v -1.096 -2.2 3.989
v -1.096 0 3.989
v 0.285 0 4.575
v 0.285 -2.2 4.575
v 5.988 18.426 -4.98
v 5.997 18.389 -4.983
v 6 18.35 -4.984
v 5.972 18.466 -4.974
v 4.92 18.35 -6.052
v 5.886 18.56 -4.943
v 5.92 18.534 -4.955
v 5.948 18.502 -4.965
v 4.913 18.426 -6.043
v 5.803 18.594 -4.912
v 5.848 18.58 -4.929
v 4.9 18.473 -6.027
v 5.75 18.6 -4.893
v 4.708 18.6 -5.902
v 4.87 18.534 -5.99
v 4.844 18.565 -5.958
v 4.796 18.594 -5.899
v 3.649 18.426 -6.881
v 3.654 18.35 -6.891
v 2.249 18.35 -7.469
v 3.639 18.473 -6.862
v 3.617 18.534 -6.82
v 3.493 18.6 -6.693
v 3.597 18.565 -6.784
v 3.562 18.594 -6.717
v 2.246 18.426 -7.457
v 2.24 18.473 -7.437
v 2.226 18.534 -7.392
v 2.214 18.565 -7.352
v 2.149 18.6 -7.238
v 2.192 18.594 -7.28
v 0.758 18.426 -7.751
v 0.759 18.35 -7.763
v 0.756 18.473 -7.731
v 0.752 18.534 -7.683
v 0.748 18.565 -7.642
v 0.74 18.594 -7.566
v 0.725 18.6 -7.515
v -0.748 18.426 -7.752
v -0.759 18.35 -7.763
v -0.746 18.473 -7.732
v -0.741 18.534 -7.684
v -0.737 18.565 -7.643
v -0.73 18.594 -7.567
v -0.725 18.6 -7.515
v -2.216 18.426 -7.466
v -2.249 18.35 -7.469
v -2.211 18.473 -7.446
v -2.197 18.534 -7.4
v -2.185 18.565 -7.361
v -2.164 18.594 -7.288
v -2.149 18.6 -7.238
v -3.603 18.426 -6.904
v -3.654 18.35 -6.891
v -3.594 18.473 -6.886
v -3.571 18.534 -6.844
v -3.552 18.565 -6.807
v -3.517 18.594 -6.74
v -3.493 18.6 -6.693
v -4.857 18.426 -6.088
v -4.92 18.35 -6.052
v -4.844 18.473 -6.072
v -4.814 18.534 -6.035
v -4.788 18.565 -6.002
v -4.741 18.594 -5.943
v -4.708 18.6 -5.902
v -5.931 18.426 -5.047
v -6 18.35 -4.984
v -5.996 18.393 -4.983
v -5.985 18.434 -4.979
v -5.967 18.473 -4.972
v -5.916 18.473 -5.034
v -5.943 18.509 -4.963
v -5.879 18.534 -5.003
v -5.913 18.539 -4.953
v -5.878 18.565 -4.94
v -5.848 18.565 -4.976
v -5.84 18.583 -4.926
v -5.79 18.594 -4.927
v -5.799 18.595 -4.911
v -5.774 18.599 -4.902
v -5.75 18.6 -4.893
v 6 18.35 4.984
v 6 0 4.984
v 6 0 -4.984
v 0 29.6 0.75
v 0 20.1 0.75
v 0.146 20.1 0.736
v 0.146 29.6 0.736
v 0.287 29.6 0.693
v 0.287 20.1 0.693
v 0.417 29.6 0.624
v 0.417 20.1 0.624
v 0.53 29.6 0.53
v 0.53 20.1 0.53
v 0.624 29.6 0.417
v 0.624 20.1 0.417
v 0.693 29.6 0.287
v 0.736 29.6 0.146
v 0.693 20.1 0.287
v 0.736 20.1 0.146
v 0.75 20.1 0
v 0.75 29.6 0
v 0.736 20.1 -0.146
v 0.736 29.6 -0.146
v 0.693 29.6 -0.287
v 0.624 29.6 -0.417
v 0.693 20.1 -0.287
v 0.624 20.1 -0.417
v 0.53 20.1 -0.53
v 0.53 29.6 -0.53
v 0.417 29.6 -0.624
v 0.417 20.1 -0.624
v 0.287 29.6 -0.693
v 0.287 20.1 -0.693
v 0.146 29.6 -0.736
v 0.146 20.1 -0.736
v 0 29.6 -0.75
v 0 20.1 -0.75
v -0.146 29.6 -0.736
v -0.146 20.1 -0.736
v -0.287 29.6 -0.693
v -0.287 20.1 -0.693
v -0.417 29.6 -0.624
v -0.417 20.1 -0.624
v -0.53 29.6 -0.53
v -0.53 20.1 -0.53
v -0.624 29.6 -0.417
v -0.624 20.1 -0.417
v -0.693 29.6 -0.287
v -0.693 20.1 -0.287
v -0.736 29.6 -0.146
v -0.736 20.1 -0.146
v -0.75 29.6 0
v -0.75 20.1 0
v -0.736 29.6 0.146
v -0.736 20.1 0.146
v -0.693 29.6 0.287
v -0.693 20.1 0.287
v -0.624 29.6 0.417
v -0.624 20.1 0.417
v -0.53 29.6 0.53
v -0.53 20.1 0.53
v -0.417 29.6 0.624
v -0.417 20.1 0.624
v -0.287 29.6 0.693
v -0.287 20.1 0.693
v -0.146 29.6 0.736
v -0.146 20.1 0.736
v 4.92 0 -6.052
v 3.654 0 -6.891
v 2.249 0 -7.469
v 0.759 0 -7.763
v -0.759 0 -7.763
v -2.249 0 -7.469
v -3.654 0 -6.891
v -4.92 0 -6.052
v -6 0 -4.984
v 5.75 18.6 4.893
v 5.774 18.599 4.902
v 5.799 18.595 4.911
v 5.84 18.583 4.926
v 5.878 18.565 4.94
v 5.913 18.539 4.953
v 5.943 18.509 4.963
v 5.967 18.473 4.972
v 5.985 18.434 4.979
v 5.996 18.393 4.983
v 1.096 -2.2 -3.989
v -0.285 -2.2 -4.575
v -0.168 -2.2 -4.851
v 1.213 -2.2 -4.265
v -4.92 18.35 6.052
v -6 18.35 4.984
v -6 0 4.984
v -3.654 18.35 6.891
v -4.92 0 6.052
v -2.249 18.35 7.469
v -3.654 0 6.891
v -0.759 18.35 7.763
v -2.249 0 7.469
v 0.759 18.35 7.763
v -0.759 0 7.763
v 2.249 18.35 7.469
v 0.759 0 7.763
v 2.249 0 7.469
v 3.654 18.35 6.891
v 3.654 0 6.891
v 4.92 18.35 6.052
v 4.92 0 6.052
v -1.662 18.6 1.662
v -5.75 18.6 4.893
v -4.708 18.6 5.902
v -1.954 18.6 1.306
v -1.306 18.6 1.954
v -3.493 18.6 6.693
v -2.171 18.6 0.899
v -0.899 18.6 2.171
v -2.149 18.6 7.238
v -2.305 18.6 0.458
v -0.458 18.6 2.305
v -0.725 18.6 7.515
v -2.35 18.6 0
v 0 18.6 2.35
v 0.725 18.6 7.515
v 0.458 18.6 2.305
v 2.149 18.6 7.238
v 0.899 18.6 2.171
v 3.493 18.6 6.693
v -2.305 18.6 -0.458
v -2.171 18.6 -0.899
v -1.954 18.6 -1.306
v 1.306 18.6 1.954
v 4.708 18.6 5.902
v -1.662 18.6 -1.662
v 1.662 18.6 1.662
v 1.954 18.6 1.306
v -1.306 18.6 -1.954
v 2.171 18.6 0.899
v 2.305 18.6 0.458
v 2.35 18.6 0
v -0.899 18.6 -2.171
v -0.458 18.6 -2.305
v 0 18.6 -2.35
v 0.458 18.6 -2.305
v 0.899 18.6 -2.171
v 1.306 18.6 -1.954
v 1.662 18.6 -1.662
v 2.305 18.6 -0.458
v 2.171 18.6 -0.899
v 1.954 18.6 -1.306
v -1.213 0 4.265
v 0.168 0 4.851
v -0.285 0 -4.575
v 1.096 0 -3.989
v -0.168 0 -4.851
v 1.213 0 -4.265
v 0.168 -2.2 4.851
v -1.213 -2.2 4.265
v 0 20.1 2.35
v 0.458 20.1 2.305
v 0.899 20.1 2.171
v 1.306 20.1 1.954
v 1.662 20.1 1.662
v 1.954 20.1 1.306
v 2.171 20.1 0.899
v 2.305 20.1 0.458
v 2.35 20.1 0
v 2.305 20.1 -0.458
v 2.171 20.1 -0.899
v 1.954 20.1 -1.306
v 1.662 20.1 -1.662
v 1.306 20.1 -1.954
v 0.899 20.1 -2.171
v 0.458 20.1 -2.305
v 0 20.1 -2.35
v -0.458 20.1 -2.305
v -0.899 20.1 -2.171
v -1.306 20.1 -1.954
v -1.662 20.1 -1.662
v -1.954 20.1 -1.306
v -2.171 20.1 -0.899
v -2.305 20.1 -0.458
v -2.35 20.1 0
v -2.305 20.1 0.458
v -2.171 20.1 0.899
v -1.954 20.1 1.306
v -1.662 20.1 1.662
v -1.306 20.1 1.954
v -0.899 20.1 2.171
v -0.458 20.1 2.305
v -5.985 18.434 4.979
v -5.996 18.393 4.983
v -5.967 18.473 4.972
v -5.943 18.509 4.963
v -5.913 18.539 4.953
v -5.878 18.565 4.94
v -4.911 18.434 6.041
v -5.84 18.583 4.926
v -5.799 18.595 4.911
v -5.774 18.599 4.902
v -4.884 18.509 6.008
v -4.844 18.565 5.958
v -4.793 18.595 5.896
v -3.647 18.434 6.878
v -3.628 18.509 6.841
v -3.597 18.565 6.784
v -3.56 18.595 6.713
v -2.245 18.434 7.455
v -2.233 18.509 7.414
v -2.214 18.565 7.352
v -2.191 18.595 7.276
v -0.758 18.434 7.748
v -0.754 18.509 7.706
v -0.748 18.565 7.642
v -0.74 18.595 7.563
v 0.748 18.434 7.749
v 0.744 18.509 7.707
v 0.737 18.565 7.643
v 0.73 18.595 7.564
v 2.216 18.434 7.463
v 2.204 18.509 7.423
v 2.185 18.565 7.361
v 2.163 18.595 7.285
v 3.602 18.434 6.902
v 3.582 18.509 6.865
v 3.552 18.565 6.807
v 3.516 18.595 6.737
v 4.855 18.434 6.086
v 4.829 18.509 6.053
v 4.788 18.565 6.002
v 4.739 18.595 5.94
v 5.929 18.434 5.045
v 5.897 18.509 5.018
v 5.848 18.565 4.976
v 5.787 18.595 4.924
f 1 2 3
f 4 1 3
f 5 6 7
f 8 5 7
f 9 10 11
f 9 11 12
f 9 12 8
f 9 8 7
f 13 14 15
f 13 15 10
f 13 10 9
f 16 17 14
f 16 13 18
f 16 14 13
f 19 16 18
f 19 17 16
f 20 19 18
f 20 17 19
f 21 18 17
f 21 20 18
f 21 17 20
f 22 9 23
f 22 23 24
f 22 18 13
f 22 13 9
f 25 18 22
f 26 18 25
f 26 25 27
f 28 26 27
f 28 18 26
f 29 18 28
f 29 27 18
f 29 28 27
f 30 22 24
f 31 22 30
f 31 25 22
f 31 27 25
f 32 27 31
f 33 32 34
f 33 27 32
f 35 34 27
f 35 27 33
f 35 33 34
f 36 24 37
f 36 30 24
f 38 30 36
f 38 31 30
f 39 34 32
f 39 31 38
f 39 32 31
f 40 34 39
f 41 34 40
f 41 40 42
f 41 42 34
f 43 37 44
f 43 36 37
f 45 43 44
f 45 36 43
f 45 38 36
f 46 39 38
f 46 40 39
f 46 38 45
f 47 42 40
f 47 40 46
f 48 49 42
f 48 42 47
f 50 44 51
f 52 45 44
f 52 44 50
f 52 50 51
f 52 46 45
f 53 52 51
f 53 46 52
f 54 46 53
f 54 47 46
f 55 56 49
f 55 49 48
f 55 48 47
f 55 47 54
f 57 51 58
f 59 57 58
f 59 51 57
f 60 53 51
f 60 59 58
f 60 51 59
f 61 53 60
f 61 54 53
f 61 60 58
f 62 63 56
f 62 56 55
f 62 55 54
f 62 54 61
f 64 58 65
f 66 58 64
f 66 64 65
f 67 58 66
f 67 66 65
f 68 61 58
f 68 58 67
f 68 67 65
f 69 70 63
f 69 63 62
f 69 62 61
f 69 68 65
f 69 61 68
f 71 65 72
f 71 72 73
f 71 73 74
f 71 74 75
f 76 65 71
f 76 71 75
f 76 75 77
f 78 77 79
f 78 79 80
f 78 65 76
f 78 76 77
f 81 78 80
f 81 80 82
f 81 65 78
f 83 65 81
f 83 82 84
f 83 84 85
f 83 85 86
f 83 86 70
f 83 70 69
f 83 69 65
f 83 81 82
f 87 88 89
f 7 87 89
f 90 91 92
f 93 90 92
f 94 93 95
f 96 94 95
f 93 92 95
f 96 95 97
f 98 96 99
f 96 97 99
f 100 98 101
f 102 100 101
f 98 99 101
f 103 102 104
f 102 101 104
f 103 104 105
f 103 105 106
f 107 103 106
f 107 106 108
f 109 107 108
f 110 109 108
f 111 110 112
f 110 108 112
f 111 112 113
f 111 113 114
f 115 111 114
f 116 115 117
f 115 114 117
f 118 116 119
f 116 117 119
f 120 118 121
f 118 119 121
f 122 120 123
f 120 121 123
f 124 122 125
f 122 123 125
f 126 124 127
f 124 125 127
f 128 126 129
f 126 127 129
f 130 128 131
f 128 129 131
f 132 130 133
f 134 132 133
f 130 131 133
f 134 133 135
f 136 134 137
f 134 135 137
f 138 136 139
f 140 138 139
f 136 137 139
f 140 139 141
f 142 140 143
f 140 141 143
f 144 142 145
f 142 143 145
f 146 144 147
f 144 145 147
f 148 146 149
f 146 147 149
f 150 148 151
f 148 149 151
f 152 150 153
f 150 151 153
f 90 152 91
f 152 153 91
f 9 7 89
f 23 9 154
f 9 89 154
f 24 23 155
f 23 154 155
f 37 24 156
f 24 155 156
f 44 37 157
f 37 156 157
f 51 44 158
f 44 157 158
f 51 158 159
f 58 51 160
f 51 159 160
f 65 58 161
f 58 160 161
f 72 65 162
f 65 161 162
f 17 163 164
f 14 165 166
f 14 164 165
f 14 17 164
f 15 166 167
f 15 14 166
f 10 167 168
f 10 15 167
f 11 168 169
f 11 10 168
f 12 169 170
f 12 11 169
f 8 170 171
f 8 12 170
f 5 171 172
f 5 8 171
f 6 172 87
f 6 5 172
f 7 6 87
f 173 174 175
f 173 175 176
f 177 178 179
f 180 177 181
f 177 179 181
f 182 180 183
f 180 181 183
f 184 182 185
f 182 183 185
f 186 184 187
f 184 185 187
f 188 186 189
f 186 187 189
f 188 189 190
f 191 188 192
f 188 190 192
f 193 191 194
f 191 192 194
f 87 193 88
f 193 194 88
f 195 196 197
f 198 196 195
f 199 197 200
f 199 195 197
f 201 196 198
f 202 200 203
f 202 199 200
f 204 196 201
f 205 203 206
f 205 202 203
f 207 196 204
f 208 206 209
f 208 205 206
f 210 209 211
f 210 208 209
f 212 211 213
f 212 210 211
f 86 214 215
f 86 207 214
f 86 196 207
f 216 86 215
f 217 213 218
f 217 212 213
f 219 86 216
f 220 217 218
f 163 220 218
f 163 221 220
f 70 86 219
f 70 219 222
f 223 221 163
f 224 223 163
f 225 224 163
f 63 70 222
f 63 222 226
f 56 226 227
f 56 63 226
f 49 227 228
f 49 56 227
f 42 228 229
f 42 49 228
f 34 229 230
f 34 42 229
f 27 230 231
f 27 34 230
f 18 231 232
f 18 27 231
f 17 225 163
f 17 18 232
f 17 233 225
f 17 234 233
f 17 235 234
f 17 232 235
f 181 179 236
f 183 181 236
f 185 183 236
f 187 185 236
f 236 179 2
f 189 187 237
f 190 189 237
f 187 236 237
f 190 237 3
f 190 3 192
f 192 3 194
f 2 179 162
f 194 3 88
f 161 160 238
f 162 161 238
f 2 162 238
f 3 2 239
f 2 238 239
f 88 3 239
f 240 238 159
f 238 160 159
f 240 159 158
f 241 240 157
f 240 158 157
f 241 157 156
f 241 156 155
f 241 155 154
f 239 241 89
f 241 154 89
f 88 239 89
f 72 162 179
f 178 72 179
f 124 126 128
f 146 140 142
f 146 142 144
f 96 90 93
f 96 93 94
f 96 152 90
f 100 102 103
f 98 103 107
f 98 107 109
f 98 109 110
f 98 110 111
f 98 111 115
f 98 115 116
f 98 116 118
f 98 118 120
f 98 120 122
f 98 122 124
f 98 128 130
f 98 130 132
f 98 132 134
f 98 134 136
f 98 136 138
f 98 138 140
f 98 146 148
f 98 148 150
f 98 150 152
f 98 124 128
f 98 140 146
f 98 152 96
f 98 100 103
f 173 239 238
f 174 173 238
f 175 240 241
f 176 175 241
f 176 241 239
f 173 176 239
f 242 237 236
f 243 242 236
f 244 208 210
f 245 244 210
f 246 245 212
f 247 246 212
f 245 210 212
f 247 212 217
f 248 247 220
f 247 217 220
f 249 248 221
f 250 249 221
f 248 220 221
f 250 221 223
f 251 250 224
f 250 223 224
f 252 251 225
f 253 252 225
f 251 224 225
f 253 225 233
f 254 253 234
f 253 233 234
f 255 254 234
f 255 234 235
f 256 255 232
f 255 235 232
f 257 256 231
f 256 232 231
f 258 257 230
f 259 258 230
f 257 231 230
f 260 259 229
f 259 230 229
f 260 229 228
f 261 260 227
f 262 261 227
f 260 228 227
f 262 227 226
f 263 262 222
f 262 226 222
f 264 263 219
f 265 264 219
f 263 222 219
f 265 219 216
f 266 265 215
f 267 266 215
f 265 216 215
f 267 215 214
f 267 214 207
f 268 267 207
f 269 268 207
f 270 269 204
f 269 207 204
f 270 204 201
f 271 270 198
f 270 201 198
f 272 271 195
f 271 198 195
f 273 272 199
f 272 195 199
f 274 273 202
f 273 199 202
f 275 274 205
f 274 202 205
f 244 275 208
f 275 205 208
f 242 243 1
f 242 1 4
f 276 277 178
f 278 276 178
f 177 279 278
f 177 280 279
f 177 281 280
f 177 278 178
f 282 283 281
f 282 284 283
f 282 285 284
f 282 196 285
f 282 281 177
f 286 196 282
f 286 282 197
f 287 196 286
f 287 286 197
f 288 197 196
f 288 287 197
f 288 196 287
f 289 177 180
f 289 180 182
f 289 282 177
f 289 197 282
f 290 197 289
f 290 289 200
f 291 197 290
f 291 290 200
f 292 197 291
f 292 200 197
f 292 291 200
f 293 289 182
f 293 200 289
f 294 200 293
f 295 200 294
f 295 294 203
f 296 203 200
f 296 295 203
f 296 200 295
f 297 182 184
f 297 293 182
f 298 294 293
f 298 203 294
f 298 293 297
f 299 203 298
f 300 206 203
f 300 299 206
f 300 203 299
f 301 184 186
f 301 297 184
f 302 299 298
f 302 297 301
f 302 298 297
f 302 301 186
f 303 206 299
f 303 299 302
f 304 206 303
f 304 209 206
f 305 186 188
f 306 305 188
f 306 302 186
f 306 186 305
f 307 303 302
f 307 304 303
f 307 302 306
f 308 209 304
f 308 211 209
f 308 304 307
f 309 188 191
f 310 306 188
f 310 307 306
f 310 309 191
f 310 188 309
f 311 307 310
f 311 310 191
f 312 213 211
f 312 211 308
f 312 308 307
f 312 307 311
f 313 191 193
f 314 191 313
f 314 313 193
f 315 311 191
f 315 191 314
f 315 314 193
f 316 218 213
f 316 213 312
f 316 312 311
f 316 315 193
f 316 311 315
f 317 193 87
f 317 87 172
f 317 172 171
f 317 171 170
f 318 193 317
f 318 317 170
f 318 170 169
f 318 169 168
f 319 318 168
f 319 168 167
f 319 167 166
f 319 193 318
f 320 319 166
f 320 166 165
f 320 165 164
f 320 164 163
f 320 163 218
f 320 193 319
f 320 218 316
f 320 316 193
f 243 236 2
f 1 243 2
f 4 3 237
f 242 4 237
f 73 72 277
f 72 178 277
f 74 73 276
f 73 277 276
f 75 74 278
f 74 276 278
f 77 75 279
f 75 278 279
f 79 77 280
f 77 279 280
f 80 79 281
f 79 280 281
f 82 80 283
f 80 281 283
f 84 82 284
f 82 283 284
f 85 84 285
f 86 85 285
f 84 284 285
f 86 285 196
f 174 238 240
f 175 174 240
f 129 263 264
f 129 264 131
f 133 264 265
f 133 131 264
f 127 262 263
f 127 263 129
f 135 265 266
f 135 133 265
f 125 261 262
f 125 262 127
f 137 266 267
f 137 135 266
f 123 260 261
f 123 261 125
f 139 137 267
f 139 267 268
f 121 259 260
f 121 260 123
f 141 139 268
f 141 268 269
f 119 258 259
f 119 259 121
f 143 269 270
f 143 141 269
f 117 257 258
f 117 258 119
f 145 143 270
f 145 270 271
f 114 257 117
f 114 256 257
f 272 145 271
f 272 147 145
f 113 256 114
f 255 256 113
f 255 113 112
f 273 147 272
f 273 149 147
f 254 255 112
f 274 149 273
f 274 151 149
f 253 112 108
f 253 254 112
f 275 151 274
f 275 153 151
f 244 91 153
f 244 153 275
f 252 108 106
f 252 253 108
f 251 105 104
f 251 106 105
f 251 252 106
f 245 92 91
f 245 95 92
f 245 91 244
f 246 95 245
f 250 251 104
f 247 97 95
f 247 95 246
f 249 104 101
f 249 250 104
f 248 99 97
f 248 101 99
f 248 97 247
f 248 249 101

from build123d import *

# Parameters (mm, degrees)
BOSS_EXTRUDE1_DEPTH = 18.6
BOSS_EXTRUDE2_DEPTH = 2.2
SKETCH3_R           = 2.35
BOSS_EXTRUDE3_DEPTH = 1.5
SKETCH4_R           = 0.75
BOSS_EXTRUDE4_DEPTH = 9.5
FILLET2_R           = 0.25


with BuildPart() as part:
    # Sketch1 → Boss-Extrude1 (new body)
    with BuildSketch(Plane(origin=(0, 0, 0), x_dir=(1, 0, 0), z_dir=(0, 1, 0))):
        with BuildLine():
            Line((-6, 4.983974318), (-6, -4.983974318))
            ThreePointArc((-6, -4.983974318), (0, -7.8), (6, -4.983974318))
            Line((6, -4.983974318), (6, 4.983974318))
            ThreePointArc((6, 4.983974318), (0, 7.8), (-6, 4.983974318))
        make_face()
    extrude(amount=BOSS_EXTRUDE1_DEPTH)

    # Sketch2 → Boss-Extrude2 (add)
    with BuildSketch(Plane.XZ):
        Polygon((1.212939296, -4.265123476), (1.095719957, -3.98897202), (-0.285037323, -4.575068713), (-0.167817984, -4.851220169), align=None)
        Polygon((0.285037323, 4.575068713), (0.167817984, 4.851220169), (-1.212939296, 4.265123476), (-1.095719957, 3.98897202), align=None)
    extrude(amount=BOSS_EXTRUDE2_DEPTH)

    # Sketch3 → Boss-Extrude3 (add)
    with BuildSketch(Plane(origin=(0, 18.6, 0), x_dir=(1, 0, 0), z_dir=(0, 1, 0))):
        with Locations(Location((0, 0, 0), (0, 0, 270))):
            Circle(SKETCH3_R)
    extrude(amount=BOSS_EXTRUDE3_DEPTH)

    # Sketch4 → Boss-Extrude4 (add)
    with BuildSketch(Plane(origin=(0, 20.1, 0), x_dir=(1, 0, 0), z_dir=(0, 1, 0))):
        with Locations(Location((0, 0, 0), (0, 0, 270))):
            Circle(SKETCH4_R)
    extrude(amount=BOSS_EXTRUDE4_DEPTH)

    # Fillet2
    fillet2_edges = [part.edges().sort_by_distance(p)[0] for p in [
        (0, 18.6, 7.8),
        (6, 18.6, 0),
        (0, 18.6, -7.8),
        (-6, 18.6, 0),
    ]]
    fillet(fillet2_edges, radius=FILLET2_R)


solid = part.part
